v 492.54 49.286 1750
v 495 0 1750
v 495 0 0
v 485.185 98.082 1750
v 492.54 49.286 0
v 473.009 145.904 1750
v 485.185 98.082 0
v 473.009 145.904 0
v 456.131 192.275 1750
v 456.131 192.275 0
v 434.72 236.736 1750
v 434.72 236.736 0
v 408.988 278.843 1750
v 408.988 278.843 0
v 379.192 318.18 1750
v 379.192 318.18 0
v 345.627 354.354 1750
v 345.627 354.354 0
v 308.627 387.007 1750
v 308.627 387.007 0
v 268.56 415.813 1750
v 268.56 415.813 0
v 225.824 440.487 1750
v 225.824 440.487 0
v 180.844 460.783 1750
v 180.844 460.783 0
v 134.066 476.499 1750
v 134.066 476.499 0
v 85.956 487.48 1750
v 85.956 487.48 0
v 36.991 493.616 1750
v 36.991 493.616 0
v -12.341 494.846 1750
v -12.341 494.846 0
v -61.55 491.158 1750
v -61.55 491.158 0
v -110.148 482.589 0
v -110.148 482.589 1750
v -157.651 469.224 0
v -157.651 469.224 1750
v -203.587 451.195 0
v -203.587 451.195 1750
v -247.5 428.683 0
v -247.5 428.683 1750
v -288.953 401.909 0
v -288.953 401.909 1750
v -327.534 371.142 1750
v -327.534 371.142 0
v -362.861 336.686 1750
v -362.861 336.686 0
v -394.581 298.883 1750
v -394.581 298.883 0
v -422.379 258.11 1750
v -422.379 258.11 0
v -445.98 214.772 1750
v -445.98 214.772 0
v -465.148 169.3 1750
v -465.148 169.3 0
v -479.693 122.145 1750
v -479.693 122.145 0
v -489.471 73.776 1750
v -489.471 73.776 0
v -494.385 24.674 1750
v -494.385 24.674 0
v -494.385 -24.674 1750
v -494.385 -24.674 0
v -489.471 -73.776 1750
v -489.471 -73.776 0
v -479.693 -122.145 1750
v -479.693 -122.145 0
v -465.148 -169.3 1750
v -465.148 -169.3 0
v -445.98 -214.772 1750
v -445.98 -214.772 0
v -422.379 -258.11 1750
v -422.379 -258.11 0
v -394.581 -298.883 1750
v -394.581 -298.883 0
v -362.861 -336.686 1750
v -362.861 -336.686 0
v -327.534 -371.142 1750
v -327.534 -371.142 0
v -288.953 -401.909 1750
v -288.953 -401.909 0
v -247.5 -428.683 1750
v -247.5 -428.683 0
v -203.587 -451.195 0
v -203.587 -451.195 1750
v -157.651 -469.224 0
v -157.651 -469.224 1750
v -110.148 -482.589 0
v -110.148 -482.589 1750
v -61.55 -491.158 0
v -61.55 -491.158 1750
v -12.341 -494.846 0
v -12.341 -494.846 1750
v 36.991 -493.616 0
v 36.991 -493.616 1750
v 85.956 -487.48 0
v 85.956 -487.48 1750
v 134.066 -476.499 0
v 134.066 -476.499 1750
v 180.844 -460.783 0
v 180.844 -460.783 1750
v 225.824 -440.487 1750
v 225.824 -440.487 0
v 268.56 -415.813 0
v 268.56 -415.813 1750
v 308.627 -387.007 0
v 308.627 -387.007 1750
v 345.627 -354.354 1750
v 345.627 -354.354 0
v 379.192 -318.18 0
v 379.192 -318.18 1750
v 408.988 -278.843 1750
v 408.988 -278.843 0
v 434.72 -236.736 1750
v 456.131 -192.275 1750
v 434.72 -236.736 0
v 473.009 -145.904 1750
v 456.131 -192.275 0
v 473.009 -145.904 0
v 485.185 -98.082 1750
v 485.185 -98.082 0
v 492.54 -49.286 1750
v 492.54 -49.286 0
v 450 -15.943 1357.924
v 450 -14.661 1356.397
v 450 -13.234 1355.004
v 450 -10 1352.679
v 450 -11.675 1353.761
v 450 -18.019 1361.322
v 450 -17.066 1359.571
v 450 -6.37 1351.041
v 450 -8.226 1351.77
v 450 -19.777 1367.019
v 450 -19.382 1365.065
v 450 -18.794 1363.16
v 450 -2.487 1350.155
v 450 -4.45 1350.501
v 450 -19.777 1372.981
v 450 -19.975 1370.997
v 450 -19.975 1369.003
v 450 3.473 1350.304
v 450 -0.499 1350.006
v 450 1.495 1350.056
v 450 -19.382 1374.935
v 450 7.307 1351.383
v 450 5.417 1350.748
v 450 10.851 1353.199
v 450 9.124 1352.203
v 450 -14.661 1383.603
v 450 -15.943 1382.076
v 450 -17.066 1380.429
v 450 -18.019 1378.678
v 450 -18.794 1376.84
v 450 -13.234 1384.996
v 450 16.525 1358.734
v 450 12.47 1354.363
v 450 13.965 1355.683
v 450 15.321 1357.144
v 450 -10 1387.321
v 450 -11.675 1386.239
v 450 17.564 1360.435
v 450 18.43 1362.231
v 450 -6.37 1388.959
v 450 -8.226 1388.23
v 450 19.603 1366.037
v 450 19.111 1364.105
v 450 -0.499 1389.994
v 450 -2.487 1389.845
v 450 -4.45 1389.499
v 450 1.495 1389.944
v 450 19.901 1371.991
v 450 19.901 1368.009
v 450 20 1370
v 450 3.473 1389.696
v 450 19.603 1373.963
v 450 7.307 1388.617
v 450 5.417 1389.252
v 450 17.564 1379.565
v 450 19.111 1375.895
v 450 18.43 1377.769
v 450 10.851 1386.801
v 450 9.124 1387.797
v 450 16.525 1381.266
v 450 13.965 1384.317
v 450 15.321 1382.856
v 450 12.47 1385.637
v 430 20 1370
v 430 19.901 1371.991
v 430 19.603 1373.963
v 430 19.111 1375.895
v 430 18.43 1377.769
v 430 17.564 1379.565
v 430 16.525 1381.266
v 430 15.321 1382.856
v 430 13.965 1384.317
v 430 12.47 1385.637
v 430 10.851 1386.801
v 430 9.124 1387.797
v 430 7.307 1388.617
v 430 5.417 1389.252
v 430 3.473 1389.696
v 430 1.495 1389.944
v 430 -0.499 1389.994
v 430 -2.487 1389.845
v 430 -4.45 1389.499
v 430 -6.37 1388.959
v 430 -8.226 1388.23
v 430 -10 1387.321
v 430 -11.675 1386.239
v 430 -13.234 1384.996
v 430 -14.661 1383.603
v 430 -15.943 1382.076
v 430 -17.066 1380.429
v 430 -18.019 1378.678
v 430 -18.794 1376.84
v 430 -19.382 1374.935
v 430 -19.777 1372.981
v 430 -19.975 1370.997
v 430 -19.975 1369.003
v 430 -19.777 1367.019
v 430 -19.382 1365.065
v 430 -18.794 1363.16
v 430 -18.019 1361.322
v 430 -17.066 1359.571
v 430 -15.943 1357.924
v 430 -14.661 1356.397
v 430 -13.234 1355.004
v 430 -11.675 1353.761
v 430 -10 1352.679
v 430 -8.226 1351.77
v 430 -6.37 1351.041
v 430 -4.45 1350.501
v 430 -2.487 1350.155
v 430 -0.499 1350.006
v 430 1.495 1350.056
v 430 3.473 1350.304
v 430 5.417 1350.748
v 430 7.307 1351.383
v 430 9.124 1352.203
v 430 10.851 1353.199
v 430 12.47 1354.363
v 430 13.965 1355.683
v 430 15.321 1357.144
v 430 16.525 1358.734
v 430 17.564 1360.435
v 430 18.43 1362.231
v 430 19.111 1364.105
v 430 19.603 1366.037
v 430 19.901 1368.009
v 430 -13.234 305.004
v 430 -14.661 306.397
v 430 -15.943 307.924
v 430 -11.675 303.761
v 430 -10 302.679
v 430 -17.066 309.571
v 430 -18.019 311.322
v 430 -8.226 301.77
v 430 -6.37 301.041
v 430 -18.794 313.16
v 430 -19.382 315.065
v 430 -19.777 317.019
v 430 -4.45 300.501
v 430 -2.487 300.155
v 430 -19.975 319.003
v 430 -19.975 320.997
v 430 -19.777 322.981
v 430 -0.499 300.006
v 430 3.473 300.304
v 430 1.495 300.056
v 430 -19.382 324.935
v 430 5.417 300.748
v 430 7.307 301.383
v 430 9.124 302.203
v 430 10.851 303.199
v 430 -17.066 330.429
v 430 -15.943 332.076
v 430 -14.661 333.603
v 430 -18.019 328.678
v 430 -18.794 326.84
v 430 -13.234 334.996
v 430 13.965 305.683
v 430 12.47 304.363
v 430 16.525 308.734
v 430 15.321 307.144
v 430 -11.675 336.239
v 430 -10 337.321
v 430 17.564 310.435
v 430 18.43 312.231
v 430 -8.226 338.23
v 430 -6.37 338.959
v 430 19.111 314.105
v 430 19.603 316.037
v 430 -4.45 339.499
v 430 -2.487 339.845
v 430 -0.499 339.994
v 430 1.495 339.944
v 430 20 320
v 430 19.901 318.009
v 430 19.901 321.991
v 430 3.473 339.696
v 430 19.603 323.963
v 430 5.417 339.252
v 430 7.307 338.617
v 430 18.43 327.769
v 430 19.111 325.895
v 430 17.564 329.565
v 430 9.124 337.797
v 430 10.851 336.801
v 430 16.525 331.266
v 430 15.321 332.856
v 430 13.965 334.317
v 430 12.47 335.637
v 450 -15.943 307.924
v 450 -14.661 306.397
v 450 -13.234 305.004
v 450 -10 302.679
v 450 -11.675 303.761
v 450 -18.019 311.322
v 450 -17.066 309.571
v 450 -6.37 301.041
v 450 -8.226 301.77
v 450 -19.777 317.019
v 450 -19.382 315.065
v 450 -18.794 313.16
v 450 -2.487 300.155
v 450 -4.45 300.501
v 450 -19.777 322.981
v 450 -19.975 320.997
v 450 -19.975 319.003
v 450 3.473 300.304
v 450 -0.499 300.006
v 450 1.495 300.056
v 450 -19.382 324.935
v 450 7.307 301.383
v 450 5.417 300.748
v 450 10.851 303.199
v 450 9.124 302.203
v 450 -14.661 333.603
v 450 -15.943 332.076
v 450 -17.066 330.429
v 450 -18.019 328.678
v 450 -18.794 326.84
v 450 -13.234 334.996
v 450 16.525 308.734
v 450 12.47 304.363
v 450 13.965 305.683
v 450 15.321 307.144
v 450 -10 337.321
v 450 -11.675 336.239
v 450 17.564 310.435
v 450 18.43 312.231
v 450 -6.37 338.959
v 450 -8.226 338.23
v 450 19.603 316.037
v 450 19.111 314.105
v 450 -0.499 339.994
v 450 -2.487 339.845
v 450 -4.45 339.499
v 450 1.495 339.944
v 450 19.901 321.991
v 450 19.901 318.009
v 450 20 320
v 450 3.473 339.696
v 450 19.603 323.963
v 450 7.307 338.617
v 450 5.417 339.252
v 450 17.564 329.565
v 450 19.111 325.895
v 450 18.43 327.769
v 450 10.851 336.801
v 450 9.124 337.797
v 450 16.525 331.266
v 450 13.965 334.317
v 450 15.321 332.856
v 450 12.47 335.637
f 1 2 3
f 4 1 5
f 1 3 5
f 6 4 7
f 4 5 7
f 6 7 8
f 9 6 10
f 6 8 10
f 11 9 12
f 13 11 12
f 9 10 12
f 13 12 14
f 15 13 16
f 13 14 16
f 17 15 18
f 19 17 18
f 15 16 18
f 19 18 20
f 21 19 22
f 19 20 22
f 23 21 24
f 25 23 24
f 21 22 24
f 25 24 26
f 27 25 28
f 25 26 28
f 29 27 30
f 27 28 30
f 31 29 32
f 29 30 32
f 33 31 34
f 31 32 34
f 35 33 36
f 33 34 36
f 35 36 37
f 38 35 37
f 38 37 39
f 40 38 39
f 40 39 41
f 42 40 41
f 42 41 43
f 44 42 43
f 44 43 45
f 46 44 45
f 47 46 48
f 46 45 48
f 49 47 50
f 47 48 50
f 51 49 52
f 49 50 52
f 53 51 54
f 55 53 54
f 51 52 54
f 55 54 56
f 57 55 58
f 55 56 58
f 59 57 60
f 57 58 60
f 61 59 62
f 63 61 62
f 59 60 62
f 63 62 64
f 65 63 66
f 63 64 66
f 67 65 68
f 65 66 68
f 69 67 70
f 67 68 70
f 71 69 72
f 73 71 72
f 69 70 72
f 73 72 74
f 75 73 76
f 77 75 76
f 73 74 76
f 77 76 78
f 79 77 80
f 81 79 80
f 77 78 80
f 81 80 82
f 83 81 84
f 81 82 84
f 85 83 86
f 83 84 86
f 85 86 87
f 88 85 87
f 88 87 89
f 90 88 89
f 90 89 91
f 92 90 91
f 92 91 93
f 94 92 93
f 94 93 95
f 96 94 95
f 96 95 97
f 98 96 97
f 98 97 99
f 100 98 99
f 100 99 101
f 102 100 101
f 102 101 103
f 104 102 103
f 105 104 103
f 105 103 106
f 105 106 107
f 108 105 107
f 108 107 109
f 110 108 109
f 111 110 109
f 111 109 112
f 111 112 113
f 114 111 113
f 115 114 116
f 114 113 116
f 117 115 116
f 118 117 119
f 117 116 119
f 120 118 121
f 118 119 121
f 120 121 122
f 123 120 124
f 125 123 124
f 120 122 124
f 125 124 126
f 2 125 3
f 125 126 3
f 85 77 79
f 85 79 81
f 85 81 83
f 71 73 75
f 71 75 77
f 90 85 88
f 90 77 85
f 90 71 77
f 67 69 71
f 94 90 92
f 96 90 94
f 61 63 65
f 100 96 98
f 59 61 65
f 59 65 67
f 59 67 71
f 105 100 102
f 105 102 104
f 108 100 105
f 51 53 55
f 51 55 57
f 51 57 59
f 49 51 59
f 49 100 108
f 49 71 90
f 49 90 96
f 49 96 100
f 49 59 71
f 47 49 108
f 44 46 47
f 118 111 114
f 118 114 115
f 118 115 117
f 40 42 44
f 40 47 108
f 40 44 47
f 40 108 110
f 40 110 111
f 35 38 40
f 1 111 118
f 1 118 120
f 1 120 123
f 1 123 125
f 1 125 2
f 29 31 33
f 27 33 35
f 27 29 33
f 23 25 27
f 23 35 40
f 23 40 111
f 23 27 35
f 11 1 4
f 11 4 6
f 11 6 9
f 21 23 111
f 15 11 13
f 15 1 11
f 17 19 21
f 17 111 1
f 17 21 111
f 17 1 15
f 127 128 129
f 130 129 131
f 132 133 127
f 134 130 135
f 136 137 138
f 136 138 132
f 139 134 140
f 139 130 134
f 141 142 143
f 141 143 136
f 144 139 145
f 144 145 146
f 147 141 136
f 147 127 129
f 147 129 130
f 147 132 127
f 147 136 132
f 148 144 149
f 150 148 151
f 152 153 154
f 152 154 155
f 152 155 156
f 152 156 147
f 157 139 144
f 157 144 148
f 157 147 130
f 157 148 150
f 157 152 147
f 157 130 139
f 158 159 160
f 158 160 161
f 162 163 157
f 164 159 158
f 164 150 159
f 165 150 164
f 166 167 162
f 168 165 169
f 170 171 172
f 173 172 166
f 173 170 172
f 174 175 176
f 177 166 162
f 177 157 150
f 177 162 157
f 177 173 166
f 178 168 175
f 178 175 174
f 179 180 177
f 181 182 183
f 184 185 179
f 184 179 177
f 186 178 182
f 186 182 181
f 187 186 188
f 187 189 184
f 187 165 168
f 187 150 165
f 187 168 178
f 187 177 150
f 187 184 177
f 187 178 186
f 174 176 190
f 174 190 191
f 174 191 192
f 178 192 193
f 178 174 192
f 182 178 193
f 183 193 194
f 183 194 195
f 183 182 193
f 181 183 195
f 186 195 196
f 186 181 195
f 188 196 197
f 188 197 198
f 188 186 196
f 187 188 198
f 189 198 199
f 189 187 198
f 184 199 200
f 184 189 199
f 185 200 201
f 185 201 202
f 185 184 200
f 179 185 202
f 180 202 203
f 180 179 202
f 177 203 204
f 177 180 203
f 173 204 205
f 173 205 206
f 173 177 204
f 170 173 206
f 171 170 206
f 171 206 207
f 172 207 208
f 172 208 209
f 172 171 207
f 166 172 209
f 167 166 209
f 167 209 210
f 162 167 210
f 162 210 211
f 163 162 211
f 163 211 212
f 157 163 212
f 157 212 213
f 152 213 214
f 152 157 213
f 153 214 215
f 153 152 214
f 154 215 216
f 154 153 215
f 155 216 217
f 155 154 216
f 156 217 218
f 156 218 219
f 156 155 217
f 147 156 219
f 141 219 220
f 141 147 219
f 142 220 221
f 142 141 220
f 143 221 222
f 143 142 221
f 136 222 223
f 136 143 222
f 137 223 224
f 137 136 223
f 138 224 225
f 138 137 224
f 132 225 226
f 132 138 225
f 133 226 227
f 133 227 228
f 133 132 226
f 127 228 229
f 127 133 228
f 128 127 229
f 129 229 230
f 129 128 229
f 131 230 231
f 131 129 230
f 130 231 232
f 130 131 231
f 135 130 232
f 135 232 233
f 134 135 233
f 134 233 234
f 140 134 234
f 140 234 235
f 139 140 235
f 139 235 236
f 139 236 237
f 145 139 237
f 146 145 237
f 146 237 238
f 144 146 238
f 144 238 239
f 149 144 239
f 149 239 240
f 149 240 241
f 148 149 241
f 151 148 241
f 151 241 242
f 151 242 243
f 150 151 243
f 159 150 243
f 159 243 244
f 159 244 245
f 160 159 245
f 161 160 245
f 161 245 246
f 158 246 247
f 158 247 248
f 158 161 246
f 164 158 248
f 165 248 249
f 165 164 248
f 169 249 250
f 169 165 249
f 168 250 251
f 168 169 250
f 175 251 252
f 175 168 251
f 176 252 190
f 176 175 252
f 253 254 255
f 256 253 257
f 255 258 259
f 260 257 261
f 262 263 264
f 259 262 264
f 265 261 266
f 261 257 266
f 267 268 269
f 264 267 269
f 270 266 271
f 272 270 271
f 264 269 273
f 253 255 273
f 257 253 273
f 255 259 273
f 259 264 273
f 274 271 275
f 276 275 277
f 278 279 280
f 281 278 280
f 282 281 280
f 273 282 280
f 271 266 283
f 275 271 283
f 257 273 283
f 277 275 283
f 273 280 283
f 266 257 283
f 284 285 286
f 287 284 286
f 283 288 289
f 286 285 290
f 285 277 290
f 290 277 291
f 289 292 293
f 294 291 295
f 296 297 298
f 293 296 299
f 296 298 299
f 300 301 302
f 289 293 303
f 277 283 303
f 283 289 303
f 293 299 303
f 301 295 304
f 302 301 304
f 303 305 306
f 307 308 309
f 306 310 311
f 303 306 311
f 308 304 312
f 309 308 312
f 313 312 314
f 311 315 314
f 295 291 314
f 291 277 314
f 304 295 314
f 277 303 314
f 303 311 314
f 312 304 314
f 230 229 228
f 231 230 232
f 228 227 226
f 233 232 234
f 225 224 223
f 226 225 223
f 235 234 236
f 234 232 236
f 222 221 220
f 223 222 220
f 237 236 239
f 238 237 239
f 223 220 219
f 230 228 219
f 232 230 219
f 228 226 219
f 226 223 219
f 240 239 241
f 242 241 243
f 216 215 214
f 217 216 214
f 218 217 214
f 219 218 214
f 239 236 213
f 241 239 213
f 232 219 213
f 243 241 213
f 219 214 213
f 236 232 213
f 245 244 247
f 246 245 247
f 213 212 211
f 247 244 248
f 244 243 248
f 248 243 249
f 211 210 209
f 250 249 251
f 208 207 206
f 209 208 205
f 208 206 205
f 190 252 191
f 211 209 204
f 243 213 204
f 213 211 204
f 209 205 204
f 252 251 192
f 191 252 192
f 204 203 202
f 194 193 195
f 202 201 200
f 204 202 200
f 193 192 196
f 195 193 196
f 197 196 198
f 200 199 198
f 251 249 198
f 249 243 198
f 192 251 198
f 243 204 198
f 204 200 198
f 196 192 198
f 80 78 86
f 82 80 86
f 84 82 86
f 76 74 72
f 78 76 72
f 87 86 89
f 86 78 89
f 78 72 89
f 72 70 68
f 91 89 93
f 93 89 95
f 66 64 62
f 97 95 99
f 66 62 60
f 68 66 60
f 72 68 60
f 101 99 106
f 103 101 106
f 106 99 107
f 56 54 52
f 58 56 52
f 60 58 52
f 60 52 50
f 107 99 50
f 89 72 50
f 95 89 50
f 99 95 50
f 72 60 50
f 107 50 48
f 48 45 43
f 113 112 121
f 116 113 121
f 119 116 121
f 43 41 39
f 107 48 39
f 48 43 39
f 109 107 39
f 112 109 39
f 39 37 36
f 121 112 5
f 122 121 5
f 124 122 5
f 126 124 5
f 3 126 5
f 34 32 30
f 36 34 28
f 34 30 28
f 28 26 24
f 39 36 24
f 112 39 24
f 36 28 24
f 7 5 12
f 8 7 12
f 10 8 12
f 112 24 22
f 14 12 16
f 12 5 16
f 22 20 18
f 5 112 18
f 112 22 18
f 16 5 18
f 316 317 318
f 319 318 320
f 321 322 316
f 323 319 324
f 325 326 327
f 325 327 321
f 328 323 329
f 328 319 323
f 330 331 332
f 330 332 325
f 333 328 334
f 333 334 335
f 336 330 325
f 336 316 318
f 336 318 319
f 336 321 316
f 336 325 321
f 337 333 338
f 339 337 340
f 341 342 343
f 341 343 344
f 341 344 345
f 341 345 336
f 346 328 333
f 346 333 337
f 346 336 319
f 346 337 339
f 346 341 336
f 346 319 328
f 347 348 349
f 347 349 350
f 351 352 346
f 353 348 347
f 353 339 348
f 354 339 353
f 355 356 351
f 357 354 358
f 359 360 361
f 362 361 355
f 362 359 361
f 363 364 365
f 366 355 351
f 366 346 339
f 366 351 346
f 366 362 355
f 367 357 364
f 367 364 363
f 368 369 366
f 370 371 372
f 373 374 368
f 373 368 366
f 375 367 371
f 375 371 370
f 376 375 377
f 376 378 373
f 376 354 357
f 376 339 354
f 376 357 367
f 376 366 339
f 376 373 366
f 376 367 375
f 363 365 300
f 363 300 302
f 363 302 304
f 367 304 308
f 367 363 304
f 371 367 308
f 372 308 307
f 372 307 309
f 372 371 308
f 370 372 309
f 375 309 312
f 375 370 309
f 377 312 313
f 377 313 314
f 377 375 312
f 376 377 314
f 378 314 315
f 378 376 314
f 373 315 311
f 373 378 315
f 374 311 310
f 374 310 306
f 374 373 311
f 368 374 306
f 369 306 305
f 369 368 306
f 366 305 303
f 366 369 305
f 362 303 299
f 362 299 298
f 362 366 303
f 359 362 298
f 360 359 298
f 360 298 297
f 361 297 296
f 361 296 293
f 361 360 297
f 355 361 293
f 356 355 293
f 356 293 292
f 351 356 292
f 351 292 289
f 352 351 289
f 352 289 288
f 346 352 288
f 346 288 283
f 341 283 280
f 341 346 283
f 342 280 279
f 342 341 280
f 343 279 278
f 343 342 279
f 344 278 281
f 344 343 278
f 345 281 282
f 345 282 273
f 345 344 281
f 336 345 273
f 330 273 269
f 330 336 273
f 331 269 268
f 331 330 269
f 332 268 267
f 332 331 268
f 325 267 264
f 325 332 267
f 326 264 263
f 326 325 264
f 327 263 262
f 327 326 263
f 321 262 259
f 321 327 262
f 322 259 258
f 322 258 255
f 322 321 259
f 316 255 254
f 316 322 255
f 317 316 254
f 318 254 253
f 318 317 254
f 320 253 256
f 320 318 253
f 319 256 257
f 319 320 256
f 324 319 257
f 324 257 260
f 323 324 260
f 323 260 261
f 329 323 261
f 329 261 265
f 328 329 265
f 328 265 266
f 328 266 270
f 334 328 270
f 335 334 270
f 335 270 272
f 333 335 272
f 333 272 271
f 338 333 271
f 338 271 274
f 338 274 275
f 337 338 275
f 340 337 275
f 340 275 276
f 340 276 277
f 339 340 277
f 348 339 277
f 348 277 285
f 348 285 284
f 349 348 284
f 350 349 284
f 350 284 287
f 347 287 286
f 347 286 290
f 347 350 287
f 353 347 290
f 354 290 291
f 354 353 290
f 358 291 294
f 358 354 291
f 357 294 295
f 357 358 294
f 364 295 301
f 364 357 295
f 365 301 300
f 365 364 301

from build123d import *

# Parameters (mm, degrees)
F0_R     = 495
F0_R_2   = 395
F1_DEPTH = 1750
F3_R     = 20
F4_DEPTH = 20


with BuildPart() as f1:
    # F0 (on Top) → F1 (new body)
    with BuildSketch(Plane.XY):
        Circle(F0_R)
        Circle(F0_R_2, mode=Mode.SUBTRACT)
        Circle(F0_R_2)
    extrude(amount=F1_DEPTH)


with BuildPart() as f4:
    # F3 (on offset) → F4 (new body)
    with BuildSketch(Plane.YZ.offset(450)):
        with Locations((0, 320)):
            Circle(F3_R)
        with Locations((0, 1370)):
            Circle(F3_R)
    extrude(amount=-F4_DEPTH)


solid = Compound([f1.part, f4.part])
